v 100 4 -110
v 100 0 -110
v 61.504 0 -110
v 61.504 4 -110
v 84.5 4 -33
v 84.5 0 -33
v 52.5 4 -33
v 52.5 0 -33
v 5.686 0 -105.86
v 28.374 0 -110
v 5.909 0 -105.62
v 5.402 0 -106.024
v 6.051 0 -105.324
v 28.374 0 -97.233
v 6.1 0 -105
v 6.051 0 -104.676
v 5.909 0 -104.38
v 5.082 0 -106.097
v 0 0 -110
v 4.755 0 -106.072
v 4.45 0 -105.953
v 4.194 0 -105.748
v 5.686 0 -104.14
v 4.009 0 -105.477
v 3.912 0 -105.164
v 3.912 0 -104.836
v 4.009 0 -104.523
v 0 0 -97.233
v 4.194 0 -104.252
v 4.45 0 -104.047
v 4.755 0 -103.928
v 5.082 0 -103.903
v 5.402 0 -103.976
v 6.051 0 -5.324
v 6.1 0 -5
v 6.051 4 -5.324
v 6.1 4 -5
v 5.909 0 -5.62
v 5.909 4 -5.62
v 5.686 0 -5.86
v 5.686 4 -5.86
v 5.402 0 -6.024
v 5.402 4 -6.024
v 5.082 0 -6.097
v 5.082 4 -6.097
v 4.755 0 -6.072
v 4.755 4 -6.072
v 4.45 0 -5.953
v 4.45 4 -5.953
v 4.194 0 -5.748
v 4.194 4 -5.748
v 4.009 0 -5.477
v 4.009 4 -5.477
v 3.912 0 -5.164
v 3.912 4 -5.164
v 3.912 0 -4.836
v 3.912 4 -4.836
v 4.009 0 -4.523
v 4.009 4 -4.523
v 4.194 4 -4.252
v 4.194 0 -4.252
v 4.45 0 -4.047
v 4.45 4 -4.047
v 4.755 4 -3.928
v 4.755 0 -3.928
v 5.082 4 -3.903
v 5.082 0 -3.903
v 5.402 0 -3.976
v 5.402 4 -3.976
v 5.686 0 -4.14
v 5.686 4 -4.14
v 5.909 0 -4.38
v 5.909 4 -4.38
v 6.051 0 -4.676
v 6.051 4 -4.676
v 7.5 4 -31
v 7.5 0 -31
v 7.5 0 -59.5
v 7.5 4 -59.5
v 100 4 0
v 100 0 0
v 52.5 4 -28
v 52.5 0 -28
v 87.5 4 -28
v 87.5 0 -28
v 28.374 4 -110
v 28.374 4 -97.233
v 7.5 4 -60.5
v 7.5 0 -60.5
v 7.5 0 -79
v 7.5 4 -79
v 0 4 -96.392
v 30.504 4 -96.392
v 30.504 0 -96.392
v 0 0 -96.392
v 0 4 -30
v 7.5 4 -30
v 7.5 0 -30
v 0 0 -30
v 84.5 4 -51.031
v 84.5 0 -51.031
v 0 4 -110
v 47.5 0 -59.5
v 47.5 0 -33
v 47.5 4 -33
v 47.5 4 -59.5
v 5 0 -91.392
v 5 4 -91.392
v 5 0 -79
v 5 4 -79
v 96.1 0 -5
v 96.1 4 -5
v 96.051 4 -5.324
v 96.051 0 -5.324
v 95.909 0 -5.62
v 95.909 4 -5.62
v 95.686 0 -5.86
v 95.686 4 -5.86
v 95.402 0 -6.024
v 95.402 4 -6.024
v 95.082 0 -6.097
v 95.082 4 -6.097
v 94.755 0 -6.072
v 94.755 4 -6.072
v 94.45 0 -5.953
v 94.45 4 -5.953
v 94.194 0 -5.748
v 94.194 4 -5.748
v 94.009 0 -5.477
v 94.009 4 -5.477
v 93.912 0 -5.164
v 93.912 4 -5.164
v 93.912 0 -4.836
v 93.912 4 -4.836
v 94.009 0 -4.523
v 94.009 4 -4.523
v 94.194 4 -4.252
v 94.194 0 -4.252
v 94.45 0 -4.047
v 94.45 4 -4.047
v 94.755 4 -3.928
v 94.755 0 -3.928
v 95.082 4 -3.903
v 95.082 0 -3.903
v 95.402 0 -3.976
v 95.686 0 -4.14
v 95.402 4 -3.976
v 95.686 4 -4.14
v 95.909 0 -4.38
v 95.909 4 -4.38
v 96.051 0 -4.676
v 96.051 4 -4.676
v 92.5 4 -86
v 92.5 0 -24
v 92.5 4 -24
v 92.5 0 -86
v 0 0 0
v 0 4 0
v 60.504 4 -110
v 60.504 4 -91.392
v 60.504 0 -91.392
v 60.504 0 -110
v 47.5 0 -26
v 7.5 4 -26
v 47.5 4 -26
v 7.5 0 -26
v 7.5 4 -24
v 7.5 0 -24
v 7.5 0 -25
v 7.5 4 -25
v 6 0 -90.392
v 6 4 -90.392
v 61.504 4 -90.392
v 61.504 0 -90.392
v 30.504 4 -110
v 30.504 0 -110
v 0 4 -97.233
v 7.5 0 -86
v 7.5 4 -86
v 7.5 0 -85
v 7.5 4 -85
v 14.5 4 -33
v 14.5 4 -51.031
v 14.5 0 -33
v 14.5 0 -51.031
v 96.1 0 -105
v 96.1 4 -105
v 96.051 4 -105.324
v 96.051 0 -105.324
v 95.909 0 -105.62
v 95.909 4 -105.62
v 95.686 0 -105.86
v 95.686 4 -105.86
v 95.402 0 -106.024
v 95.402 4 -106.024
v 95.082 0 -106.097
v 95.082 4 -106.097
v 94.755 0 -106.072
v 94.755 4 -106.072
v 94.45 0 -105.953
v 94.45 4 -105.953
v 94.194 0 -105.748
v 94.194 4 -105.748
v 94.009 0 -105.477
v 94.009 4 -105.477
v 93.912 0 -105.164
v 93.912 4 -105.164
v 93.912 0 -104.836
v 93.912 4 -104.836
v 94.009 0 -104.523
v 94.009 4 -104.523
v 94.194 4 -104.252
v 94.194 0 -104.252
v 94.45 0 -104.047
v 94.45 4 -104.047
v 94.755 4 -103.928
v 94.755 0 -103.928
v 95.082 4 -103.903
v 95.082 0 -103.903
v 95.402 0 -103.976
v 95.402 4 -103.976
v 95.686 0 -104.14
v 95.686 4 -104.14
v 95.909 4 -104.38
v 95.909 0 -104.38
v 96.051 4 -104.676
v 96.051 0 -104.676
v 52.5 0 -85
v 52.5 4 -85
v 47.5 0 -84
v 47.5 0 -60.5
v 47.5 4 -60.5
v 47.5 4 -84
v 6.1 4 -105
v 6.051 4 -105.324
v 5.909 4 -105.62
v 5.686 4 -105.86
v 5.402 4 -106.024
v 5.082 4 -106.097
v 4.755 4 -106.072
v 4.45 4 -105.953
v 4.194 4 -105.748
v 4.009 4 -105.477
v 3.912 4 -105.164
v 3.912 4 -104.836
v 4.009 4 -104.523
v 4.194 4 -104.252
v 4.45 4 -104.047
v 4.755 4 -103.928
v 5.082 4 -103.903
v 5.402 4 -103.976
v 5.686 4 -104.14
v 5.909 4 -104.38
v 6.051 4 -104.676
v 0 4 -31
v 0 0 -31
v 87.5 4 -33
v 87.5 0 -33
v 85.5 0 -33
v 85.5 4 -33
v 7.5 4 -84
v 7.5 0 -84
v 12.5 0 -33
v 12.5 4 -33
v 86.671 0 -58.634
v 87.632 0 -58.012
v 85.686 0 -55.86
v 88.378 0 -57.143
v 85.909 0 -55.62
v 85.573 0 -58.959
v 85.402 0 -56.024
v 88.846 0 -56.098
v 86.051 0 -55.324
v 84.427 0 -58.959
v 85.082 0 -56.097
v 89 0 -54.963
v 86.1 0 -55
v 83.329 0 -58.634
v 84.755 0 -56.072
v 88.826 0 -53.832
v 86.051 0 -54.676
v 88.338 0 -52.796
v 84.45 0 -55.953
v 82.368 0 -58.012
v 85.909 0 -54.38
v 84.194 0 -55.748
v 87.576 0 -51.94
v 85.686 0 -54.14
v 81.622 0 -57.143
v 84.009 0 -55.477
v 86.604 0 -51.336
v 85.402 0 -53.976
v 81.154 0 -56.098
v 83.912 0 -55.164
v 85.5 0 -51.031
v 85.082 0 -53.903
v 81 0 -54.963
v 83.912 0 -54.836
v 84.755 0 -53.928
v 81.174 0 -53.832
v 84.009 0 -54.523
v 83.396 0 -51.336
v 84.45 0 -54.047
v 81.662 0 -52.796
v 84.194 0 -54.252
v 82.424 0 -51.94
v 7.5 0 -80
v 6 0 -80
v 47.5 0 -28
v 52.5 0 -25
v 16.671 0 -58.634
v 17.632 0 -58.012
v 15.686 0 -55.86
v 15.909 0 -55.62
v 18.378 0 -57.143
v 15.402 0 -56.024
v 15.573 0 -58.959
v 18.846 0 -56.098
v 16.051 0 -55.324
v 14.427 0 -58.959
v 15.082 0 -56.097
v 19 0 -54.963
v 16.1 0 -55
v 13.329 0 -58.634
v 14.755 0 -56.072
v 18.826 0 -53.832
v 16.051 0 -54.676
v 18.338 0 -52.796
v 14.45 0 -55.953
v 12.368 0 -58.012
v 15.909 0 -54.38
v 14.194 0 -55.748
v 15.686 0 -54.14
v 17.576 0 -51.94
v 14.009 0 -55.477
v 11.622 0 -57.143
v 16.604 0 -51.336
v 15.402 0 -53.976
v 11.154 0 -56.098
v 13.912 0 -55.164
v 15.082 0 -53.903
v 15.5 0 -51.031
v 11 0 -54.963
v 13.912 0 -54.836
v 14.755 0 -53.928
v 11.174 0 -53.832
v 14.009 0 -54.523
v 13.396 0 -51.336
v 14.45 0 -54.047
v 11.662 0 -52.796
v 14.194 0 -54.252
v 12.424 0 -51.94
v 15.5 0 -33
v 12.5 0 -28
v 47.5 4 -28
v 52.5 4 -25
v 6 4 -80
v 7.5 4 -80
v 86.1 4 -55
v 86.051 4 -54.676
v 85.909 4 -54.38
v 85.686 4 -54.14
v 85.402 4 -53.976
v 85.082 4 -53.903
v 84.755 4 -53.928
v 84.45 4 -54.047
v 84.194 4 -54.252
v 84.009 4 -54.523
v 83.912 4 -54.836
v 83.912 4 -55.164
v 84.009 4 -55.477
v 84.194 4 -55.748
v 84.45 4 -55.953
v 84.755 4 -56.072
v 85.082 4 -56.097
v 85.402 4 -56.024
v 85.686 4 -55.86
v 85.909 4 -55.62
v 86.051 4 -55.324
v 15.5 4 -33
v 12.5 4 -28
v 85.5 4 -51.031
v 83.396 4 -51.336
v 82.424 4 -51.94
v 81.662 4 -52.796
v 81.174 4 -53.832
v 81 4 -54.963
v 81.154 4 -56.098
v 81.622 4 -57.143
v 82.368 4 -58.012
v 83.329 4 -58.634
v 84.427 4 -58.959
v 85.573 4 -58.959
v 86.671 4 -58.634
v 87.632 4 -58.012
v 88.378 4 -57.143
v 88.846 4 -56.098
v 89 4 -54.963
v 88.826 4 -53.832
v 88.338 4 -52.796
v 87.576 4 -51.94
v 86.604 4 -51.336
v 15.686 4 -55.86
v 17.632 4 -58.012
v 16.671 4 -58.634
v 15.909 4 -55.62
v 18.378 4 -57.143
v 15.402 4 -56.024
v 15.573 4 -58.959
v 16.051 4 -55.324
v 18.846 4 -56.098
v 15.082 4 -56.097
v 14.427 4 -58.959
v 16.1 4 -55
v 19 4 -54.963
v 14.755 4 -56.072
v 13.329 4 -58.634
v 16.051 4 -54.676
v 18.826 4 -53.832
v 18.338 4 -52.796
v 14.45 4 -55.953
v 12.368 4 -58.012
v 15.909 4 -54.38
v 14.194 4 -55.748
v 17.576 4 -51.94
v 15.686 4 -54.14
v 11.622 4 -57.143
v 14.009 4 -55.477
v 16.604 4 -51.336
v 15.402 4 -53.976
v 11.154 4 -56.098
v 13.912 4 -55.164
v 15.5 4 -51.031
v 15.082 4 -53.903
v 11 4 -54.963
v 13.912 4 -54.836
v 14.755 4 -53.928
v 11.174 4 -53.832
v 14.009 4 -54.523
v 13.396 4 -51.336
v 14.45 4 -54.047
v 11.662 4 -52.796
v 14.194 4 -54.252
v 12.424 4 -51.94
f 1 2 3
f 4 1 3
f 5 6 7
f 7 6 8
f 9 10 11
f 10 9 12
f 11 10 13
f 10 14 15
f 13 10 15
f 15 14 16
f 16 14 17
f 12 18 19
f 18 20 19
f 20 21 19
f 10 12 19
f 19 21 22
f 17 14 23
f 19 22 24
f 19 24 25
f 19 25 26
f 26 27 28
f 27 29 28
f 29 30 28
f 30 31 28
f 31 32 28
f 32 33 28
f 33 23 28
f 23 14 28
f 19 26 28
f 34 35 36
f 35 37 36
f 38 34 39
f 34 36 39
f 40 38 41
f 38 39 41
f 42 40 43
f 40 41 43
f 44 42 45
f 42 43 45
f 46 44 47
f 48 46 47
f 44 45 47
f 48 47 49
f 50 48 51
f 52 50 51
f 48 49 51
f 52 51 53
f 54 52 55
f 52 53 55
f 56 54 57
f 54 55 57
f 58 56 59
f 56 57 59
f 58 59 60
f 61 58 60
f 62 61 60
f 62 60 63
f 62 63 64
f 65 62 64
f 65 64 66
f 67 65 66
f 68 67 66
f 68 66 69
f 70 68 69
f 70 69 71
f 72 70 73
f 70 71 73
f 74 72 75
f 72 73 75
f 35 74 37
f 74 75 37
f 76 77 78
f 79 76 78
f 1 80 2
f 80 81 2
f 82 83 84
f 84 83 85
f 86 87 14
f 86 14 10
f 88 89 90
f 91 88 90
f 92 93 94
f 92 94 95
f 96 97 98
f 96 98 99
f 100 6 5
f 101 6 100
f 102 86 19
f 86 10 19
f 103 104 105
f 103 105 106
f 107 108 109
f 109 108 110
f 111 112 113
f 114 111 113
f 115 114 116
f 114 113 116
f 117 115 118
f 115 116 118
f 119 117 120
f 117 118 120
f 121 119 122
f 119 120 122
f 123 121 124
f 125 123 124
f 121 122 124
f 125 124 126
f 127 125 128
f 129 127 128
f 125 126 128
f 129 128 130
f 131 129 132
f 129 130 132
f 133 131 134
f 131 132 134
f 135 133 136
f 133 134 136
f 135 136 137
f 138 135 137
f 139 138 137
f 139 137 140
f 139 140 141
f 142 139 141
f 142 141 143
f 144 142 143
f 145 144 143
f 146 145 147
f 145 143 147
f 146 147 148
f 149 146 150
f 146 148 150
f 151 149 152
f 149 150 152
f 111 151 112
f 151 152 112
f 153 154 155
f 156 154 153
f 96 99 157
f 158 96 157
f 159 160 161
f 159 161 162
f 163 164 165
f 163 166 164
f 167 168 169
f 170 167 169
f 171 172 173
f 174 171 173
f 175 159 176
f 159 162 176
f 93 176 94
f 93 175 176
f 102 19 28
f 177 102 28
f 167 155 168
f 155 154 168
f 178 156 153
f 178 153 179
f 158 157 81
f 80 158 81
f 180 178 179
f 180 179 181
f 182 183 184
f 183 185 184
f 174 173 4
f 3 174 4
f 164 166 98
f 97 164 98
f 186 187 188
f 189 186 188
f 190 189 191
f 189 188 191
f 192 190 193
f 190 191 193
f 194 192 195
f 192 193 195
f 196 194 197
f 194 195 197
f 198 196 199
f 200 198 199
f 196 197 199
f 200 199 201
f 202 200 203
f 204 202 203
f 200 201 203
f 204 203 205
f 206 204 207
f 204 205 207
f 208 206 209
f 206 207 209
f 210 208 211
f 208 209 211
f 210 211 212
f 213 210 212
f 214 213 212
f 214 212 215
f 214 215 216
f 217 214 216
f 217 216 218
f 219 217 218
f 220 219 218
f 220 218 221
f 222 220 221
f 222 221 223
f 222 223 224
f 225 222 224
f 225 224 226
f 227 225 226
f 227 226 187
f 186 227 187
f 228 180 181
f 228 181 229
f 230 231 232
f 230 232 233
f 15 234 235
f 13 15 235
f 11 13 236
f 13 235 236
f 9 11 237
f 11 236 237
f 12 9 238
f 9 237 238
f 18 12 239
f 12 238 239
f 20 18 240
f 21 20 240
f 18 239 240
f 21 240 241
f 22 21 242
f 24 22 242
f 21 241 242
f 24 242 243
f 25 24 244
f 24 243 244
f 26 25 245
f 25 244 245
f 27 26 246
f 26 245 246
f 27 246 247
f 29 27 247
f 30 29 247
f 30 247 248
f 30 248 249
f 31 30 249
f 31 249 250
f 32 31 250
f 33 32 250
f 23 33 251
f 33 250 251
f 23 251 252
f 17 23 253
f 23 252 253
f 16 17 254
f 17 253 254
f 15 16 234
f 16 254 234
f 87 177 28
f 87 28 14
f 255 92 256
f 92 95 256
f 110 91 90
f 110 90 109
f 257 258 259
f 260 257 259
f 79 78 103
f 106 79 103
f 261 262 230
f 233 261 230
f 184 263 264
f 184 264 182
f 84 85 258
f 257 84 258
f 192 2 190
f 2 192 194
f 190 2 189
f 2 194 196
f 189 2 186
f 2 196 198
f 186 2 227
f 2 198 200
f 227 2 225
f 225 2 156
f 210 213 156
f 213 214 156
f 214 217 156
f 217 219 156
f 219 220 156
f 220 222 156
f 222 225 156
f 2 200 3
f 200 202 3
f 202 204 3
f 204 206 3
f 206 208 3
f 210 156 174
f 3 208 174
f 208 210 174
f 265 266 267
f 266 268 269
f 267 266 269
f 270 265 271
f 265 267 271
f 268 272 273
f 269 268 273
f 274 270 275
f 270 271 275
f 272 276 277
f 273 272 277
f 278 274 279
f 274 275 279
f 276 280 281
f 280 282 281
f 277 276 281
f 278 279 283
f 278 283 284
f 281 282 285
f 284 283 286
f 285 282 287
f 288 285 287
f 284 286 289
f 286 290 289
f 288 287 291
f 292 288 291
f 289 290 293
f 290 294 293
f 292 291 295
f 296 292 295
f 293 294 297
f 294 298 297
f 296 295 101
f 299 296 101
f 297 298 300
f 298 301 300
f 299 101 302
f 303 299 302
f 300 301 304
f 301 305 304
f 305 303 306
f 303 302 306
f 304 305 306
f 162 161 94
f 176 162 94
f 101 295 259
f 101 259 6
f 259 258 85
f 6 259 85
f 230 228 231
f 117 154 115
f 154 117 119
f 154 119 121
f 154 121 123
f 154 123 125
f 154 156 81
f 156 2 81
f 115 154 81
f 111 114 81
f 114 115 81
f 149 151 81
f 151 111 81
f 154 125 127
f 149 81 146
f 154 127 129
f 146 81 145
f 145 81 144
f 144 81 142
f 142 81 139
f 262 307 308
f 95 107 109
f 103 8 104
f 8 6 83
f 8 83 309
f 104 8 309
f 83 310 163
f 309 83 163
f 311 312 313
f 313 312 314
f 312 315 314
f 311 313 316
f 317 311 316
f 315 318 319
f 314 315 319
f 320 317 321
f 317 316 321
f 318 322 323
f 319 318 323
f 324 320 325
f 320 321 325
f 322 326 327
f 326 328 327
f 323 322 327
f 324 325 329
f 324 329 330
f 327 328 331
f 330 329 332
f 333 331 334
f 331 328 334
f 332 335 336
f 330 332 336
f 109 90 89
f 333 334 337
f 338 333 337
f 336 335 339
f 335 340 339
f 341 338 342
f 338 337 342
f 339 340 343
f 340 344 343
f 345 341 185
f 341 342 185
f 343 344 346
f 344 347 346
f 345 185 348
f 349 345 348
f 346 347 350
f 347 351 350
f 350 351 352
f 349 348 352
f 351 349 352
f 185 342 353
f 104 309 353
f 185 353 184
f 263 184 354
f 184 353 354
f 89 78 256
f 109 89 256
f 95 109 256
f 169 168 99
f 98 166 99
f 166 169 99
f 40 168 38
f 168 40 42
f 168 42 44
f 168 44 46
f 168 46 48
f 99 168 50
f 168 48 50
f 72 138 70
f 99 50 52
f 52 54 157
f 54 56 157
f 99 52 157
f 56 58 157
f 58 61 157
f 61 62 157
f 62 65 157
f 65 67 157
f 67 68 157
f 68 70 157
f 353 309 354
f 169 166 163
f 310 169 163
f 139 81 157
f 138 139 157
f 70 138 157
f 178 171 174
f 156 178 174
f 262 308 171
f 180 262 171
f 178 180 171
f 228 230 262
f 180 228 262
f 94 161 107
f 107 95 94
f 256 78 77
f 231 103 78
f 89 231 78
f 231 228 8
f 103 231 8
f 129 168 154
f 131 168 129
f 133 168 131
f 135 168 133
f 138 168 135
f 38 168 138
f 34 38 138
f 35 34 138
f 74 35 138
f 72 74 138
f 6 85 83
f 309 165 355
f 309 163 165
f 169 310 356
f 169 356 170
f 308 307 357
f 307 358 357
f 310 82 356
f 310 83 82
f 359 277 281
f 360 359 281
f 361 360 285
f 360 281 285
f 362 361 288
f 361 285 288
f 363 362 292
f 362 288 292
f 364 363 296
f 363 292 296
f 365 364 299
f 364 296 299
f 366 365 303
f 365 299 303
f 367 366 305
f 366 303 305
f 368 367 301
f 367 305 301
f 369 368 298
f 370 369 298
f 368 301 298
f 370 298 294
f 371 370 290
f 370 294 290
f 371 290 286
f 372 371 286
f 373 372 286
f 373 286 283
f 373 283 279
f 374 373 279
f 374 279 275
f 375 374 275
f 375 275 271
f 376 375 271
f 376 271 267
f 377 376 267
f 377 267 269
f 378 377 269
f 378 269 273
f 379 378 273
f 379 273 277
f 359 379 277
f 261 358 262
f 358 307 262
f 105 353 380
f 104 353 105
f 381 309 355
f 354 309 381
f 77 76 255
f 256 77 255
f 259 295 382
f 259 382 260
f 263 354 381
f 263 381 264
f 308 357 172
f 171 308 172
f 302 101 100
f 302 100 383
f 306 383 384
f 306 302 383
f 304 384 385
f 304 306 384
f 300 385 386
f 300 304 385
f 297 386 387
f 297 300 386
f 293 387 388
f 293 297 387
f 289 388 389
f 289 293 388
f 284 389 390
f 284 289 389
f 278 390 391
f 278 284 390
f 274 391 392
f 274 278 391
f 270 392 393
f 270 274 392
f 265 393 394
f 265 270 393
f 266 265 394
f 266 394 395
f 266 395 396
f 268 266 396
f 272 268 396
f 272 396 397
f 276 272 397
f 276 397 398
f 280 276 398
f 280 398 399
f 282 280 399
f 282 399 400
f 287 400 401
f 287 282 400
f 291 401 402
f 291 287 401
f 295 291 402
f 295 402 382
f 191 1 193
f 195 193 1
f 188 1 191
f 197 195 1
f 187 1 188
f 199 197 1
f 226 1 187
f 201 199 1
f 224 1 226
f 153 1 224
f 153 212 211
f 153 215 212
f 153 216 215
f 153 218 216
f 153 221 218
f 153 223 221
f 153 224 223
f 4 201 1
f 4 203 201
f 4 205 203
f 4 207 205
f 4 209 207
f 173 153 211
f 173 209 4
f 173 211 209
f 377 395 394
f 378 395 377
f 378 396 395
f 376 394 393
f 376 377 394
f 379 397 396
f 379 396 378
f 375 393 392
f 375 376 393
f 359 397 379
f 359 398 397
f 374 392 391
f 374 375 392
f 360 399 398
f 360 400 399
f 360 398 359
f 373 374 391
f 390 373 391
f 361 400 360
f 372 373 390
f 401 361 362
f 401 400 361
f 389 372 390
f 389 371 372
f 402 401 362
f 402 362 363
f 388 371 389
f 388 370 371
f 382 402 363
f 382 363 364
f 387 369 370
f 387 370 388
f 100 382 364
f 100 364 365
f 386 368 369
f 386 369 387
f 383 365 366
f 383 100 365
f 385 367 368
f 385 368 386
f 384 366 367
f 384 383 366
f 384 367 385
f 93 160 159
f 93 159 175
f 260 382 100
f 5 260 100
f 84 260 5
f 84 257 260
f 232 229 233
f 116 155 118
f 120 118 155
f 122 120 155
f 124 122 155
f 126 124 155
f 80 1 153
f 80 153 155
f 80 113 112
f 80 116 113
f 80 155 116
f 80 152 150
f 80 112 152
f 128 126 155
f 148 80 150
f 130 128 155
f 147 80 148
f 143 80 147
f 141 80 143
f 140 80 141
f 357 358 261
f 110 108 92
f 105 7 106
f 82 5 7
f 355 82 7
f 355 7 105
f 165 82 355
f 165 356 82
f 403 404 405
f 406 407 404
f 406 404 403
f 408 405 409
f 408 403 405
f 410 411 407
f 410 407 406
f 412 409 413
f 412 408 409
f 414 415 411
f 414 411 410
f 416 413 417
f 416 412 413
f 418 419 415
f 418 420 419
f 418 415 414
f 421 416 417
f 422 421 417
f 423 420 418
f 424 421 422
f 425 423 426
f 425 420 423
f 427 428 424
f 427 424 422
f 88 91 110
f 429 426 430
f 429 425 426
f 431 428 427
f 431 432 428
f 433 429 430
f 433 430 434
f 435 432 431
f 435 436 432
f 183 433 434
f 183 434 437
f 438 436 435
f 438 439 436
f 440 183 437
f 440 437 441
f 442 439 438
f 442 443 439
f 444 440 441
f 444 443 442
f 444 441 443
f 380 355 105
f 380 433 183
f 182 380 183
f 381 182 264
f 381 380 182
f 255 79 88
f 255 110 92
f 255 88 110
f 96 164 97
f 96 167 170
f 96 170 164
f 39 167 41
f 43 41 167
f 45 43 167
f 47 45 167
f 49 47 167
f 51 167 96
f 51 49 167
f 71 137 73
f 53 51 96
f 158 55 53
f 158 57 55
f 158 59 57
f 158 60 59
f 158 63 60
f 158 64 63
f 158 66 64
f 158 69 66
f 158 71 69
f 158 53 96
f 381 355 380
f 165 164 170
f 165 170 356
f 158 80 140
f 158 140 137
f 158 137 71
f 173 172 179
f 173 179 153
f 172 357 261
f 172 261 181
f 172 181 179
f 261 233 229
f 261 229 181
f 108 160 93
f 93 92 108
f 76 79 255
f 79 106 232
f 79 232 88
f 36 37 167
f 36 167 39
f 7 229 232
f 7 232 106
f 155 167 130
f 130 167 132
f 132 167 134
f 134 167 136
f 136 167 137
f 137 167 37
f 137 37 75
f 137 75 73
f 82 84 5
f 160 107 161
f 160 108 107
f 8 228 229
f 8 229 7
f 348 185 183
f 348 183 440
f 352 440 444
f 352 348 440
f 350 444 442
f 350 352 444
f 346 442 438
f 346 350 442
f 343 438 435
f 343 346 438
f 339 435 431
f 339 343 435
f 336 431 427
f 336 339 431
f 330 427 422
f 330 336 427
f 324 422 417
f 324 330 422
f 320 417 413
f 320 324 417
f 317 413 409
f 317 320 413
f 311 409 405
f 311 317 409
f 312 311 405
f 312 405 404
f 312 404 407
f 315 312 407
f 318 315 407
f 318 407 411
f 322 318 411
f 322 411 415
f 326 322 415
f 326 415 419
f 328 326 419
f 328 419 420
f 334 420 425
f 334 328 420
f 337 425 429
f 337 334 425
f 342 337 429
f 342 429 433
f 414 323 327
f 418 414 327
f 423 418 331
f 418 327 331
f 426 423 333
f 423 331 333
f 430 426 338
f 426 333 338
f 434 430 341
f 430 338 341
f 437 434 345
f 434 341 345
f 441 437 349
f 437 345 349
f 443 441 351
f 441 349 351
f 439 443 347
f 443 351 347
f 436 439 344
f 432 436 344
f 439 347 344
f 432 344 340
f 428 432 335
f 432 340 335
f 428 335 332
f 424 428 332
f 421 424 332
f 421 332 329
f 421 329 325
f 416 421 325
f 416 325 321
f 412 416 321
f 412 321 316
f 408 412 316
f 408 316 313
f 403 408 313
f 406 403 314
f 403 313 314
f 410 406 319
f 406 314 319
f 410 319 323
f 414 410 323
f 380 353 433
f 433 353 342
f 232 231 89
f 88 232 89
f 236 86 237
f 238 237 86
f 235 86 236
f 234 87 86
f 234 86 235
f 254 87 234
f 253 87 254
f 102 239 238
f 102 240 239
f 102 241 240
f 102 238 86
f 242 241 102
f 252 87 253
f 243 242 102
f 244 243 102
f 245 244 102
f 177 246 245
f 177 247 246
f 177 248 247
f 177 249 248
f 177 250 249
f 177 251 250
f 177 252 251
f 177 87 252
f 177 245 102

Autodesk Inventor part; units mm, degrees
ref_plane "YZ Plane" through (0, 0, 0) normal (1, 0, 0) x (0, 1, 0)
ref_plane "XZ Plane" through (0, 0, 0) normal (0, 1, 0) x (-1, 0, 0)
ref_plane "XY Plane" through (0, 0, 0) normal (0, 0, 1) x (1, 0, 0)
sketch "Sketch1" plane through (0, 0, 0) normal (0, 1, 0) x (-1, 0, 0)
  line L0 (0, 0) -> (-100, 0)
  line L1 (-100, 0) -> (-100, -110)
  line L2 (-100, -110) -> (0, -110)
  line L3 (0, -110) -> (0, 0)
  dimension "d0" = 110
  dimension "d1" = 100
extrude "Extrusion1" add sketch "Sketch1" along normal blind 4
sketch "Sketch5" plane through (0, 4, 0) normal (0, 1, 0) x (1, 0, 0)
  circle A0 centre (5, 5) radius 1.1
  line L0 (0, 0) -> (100, 0) projected
  line L1 (0, 110) -> (0, 0) projected
  line L2 (0, 55) -> (10.2566, 55)
  circle A1 centre (5, 105) radius 1.1
  line L3 (0, 110) -> (100, 110)
  line L4 (0, 0) -> (0, 110)
  line L5 (50, 0) -> (50, 7.5266)
  circle A2 centre (95, 5) radius 1.1
  line L6 (100, 110) -> (100, 0)
  circle A3 centre (95, 105) radius 1.1
  line L7 (100, 0) -> (100, 110)
  point P0 (100, 55)
  point P1 (89.7434, 55)
  dimension "d41" = 5
  dimension "d42" = 5
  dimension "d43" = 2.2
extrude "Extrusion4" cut sketch "Sketch5" against normal blind 10 contours A0 | A1 | A2 | A3
thread "Thread7" size "M2.5x0.45" class "6H" standard "ANSI Metric M Profile" length 10
thread "Thread8" size "M2.5x0.45" class "6H" standard "ANSI Metric M Profile" length 10
thread "Thread9" size "M2.5x0.45" class "6H" standard "ANSI Metric M Profile" length 10
thread "Thread10" size "M2.5x0.45" class "6H" standard "ANSI Metric M Profile" length 10
sketch "Sketch6" plane through (0, 0, 0) normal (0, -1, 0) x (1, 0, 0)
  line L0 (0, 0) -> (100, 0) projected
  line L1 (0, -110) -> (0, 0) projected
  line L2 (47.5, -85) -> (52.5, -85)
  line L3 (52.5, -85) -> (52.5, -25)
  line L4 (52.5, -25) -> (47.5, -25)
  line L5 (47.5, -25) -> (47.5, -85)
  line L6 (47.5, -85) -> (52.5, -25) construction
  line L7 (52.5, -85) -> (47.5, -25) construction
  line L8 (100, 0) -> (100, -110) projected
  line L9 (100, -110) -> (0, -110) projected
  line L10 (47.5, -25) -> (7.5, -25)
  line L11 (7.5, -25) -> (7.5, -26)
  line L12 (7.5, -26) -> (47.5, -26)
  line L13 (47.5, -26) -> (47.5, -25)
  line L14 (47.5, -85) -> (7.5, -85)
  line L15 (7.5, -85) -> (7.5, -84)
  line L16 (7.5, -84) -> (47.5, -84)
  line L17 (47.5, -84) -> (47.5, -85)
  line L18 (52.5, -33) -> (52.5, -28)
  circle A0 centre (15, -55) radius 1.1
  line L19 (7.5, -26) -> (7.5, -84)
  line L20 (92.5, -28) -> (92.5, -85)
  line L21 (92.5, -85) -> (52.5, -85)
  line L22 (52.5, -85) -> (52.5, -28)
  line L23 (7.5, -25) -> (92.5, -25)
  line L24 (92.5, -25) -> (92.5, -24)
  line L25 (92.5, -24) -> (7.5, -24)
  line L26 (7.5, -24) -> (7.5, -25)
  line L27 (7.5, -85) -> (92.5, -85)
  line L28 (92.5, -85) -> (92.5, -86)
  line L29 (92.5, -86) -> (7.5, -86)
  line L30 (7.5, -86) -> (7.5, -85)
  line L31 (92.5, -28) -> (92.5, -25)
  line L32 (47.5, -60.5) -> (7.5, -60.5)
  line L33 (7.5, -60.5) -> (7.5, -59.5)
  line L34 (7.5, -59.5) -> (47.5, -59.5)
  line L35 (47.5, -59.5) -> (47.5, -60.5)
  line L36 (47.5, -28) -> (12.5, -28)
  line L37 (12.5, -28) -> (12.5, -33)
  line L38 (12.5, -33) -> (47.5, -33)
  line L39 (47.5, -33) -> (47.5, -28)
  arc A1 (14.5, -51.0314) -> (15.5, -51.0314) centre (15, -55) ccw
  line L40 (14.5, -33) -> (15.5, -33)
  line L41 (15.5, -33) -> (15.5, -51.0314)
  line L42 (14.5, -51.0314) -> (14.5, -33)
  line L43 (50, -85) -> (50, -73.5088)
  circle A2 centre (85, -55) radius 1.1
  line L44 (52.5, -28) -> (87.5, -28)
  line L45 (87.5, -28) -> (87.5, -33)
  line L46 (87.5, -33) -> (52.5, -33)
  line L47 (52.5, -33) -> (52.5, -28)
  arc A3 (84.5, -51.0314) -> (85.5, -51.0314) centre (85, -55) ccw
  line L48 (85.5, -33) -> (84.5, -33)
  line L49 (84.5, -33) -> (84.5, -51.0314)
  line L50 (85.5, -51.0314) -> (85.5, -33)
  point P0 (50, -55)
  point P1 (47.5, -59.5)
  point P2 (15.5, -42.2901)
  point P3 (15, -51.5803)
  point P4 (84.5, -42.2901)
  point P5 (85, -51.5803)
  point P6 (52.5, -25)
  point P7 (47.5, -59.5)
  dimension "d113" = 50
  dimension "d115" = 5
  dimension "d117" = 1
  dimension "d119" = 40
  dimension "d121" = 40
  dimension "d122" = 1
  dimension "d140" = 2.2
  dimension "d141" = 40
  dimension "d142" = 1
  dimension "d143" = 1
  dimension "d151" = 1
  dimension "d166" = 35
  dimension "d167" = 55
  dimension "d168" = 35
  dimension "d169" = 5
  dimension "d170" = 2
  dimension "d171" = 8
  dimension "d172" = 1
  dimension "d173" = 0
extrude "Extrusion5" cut sketch "Sketch6" against normal blind 4 contours L2 L21 L28 L29 L30 L14 | L16 L19 L32 L5 | L3 L46 L49 A3 L50 L45 L44 L23 L31 L20 L21 | L34 L19 L12 L5 L36 L37 L38 L42 A1 L41 | L4 L10 L26 L25 L24 L23 | A0 | A2
sketch "Sketch8" plane through (0, 4, 0) normal (0, 1, 0) x (1, 0, 0)
  line L0 (100, 110) -> (0, 110) projected
  line L1 (60.5042, 110) -> (30.5042, 110)
  line L2 (30.5042, 110) -> (30.5042, 96.3922)
  line L3 (30.5042, 96.3922) -> (60.5042, 96.3922)
  line L4 (60.5042, 96.3922) -> (60.5042, 110)
  line L5 (0, 110) -> (0, 0) projected
  line L6 (60.5042, 96.3922) -> (0, 96.3922)
  line L7 (0, 96.3922) -> (0, 91.3922)
  line L8 (0, 91.3922) -> (60.5042, 91.3922)
  line L9 (60.5042, 91.3922) -> (60.5042, 96.3922)
  line L10 (0, 91.3922) -> (5, 91.3922)
  line L11 (5, 91.3922) -> (5, 31)
  line L12 (5, 31) -> (0, 31)
  line L13 (0, 31) -> (0, 91.3922)
  line L14 (7.5, 60.5) -> (7.5, 84) projected
  line L15 (5, 31) -> (7.5, 31)
  line L16 (7.5, 31) -> (7.5, 79)
  line L17 (7.5, 79) -> (5, 79)
  line L18 (5, 79) -> (5, 31)
  line L19 (7.5, 84) -> (47.5, 84) projected
  line L20 (47.5, 26) -> (7.5, 26) projected
  line L21 (7.5, 80) -> (6, 80)
  line L22 (6, 80) -> (6, 90.3922)
  line L23 (6, 90.3922) -> (61.5042, 90.3922)
  line L24 (61.5042, 90.3922) -> (61.5042, 110)
  line L25 (0, 97.2327) -> (28.374, 97.2327)
  line L26 (28.374, 97.2327) -> (28.374, 110)
  line L27 (7.5, 26) -> (7.5, 59.5) projected
  line L28 (7.5, 30) -> (0, 30)
  point P0 (6.25, 79)
  point P1 (0, 31)
  point P2 (0, 96.3922)
  point P3 (5, 91.3922)
  dimension "d153" = 5
  dimension "d154" = 5
  dimension "d155" = 5
  dimension "d156" = 5
  dimension "d157" = 30
  dimension "d158" = 1
  dimension "d159" = 1
  dimension "d160" = 1
  dimension "d161" = 1
  dimension "d162" = 1
extrude "Extrusion6" cut sketch "Sketch8" against normal blind 4 contours L24 L23 L22 L21 L14 L17 L11 L8 L9 L4 L0 | L2 L6 L5 L25 L26 L0 | L12 L15 L27 L28 L5
properties part number "FlexK7Holder"
